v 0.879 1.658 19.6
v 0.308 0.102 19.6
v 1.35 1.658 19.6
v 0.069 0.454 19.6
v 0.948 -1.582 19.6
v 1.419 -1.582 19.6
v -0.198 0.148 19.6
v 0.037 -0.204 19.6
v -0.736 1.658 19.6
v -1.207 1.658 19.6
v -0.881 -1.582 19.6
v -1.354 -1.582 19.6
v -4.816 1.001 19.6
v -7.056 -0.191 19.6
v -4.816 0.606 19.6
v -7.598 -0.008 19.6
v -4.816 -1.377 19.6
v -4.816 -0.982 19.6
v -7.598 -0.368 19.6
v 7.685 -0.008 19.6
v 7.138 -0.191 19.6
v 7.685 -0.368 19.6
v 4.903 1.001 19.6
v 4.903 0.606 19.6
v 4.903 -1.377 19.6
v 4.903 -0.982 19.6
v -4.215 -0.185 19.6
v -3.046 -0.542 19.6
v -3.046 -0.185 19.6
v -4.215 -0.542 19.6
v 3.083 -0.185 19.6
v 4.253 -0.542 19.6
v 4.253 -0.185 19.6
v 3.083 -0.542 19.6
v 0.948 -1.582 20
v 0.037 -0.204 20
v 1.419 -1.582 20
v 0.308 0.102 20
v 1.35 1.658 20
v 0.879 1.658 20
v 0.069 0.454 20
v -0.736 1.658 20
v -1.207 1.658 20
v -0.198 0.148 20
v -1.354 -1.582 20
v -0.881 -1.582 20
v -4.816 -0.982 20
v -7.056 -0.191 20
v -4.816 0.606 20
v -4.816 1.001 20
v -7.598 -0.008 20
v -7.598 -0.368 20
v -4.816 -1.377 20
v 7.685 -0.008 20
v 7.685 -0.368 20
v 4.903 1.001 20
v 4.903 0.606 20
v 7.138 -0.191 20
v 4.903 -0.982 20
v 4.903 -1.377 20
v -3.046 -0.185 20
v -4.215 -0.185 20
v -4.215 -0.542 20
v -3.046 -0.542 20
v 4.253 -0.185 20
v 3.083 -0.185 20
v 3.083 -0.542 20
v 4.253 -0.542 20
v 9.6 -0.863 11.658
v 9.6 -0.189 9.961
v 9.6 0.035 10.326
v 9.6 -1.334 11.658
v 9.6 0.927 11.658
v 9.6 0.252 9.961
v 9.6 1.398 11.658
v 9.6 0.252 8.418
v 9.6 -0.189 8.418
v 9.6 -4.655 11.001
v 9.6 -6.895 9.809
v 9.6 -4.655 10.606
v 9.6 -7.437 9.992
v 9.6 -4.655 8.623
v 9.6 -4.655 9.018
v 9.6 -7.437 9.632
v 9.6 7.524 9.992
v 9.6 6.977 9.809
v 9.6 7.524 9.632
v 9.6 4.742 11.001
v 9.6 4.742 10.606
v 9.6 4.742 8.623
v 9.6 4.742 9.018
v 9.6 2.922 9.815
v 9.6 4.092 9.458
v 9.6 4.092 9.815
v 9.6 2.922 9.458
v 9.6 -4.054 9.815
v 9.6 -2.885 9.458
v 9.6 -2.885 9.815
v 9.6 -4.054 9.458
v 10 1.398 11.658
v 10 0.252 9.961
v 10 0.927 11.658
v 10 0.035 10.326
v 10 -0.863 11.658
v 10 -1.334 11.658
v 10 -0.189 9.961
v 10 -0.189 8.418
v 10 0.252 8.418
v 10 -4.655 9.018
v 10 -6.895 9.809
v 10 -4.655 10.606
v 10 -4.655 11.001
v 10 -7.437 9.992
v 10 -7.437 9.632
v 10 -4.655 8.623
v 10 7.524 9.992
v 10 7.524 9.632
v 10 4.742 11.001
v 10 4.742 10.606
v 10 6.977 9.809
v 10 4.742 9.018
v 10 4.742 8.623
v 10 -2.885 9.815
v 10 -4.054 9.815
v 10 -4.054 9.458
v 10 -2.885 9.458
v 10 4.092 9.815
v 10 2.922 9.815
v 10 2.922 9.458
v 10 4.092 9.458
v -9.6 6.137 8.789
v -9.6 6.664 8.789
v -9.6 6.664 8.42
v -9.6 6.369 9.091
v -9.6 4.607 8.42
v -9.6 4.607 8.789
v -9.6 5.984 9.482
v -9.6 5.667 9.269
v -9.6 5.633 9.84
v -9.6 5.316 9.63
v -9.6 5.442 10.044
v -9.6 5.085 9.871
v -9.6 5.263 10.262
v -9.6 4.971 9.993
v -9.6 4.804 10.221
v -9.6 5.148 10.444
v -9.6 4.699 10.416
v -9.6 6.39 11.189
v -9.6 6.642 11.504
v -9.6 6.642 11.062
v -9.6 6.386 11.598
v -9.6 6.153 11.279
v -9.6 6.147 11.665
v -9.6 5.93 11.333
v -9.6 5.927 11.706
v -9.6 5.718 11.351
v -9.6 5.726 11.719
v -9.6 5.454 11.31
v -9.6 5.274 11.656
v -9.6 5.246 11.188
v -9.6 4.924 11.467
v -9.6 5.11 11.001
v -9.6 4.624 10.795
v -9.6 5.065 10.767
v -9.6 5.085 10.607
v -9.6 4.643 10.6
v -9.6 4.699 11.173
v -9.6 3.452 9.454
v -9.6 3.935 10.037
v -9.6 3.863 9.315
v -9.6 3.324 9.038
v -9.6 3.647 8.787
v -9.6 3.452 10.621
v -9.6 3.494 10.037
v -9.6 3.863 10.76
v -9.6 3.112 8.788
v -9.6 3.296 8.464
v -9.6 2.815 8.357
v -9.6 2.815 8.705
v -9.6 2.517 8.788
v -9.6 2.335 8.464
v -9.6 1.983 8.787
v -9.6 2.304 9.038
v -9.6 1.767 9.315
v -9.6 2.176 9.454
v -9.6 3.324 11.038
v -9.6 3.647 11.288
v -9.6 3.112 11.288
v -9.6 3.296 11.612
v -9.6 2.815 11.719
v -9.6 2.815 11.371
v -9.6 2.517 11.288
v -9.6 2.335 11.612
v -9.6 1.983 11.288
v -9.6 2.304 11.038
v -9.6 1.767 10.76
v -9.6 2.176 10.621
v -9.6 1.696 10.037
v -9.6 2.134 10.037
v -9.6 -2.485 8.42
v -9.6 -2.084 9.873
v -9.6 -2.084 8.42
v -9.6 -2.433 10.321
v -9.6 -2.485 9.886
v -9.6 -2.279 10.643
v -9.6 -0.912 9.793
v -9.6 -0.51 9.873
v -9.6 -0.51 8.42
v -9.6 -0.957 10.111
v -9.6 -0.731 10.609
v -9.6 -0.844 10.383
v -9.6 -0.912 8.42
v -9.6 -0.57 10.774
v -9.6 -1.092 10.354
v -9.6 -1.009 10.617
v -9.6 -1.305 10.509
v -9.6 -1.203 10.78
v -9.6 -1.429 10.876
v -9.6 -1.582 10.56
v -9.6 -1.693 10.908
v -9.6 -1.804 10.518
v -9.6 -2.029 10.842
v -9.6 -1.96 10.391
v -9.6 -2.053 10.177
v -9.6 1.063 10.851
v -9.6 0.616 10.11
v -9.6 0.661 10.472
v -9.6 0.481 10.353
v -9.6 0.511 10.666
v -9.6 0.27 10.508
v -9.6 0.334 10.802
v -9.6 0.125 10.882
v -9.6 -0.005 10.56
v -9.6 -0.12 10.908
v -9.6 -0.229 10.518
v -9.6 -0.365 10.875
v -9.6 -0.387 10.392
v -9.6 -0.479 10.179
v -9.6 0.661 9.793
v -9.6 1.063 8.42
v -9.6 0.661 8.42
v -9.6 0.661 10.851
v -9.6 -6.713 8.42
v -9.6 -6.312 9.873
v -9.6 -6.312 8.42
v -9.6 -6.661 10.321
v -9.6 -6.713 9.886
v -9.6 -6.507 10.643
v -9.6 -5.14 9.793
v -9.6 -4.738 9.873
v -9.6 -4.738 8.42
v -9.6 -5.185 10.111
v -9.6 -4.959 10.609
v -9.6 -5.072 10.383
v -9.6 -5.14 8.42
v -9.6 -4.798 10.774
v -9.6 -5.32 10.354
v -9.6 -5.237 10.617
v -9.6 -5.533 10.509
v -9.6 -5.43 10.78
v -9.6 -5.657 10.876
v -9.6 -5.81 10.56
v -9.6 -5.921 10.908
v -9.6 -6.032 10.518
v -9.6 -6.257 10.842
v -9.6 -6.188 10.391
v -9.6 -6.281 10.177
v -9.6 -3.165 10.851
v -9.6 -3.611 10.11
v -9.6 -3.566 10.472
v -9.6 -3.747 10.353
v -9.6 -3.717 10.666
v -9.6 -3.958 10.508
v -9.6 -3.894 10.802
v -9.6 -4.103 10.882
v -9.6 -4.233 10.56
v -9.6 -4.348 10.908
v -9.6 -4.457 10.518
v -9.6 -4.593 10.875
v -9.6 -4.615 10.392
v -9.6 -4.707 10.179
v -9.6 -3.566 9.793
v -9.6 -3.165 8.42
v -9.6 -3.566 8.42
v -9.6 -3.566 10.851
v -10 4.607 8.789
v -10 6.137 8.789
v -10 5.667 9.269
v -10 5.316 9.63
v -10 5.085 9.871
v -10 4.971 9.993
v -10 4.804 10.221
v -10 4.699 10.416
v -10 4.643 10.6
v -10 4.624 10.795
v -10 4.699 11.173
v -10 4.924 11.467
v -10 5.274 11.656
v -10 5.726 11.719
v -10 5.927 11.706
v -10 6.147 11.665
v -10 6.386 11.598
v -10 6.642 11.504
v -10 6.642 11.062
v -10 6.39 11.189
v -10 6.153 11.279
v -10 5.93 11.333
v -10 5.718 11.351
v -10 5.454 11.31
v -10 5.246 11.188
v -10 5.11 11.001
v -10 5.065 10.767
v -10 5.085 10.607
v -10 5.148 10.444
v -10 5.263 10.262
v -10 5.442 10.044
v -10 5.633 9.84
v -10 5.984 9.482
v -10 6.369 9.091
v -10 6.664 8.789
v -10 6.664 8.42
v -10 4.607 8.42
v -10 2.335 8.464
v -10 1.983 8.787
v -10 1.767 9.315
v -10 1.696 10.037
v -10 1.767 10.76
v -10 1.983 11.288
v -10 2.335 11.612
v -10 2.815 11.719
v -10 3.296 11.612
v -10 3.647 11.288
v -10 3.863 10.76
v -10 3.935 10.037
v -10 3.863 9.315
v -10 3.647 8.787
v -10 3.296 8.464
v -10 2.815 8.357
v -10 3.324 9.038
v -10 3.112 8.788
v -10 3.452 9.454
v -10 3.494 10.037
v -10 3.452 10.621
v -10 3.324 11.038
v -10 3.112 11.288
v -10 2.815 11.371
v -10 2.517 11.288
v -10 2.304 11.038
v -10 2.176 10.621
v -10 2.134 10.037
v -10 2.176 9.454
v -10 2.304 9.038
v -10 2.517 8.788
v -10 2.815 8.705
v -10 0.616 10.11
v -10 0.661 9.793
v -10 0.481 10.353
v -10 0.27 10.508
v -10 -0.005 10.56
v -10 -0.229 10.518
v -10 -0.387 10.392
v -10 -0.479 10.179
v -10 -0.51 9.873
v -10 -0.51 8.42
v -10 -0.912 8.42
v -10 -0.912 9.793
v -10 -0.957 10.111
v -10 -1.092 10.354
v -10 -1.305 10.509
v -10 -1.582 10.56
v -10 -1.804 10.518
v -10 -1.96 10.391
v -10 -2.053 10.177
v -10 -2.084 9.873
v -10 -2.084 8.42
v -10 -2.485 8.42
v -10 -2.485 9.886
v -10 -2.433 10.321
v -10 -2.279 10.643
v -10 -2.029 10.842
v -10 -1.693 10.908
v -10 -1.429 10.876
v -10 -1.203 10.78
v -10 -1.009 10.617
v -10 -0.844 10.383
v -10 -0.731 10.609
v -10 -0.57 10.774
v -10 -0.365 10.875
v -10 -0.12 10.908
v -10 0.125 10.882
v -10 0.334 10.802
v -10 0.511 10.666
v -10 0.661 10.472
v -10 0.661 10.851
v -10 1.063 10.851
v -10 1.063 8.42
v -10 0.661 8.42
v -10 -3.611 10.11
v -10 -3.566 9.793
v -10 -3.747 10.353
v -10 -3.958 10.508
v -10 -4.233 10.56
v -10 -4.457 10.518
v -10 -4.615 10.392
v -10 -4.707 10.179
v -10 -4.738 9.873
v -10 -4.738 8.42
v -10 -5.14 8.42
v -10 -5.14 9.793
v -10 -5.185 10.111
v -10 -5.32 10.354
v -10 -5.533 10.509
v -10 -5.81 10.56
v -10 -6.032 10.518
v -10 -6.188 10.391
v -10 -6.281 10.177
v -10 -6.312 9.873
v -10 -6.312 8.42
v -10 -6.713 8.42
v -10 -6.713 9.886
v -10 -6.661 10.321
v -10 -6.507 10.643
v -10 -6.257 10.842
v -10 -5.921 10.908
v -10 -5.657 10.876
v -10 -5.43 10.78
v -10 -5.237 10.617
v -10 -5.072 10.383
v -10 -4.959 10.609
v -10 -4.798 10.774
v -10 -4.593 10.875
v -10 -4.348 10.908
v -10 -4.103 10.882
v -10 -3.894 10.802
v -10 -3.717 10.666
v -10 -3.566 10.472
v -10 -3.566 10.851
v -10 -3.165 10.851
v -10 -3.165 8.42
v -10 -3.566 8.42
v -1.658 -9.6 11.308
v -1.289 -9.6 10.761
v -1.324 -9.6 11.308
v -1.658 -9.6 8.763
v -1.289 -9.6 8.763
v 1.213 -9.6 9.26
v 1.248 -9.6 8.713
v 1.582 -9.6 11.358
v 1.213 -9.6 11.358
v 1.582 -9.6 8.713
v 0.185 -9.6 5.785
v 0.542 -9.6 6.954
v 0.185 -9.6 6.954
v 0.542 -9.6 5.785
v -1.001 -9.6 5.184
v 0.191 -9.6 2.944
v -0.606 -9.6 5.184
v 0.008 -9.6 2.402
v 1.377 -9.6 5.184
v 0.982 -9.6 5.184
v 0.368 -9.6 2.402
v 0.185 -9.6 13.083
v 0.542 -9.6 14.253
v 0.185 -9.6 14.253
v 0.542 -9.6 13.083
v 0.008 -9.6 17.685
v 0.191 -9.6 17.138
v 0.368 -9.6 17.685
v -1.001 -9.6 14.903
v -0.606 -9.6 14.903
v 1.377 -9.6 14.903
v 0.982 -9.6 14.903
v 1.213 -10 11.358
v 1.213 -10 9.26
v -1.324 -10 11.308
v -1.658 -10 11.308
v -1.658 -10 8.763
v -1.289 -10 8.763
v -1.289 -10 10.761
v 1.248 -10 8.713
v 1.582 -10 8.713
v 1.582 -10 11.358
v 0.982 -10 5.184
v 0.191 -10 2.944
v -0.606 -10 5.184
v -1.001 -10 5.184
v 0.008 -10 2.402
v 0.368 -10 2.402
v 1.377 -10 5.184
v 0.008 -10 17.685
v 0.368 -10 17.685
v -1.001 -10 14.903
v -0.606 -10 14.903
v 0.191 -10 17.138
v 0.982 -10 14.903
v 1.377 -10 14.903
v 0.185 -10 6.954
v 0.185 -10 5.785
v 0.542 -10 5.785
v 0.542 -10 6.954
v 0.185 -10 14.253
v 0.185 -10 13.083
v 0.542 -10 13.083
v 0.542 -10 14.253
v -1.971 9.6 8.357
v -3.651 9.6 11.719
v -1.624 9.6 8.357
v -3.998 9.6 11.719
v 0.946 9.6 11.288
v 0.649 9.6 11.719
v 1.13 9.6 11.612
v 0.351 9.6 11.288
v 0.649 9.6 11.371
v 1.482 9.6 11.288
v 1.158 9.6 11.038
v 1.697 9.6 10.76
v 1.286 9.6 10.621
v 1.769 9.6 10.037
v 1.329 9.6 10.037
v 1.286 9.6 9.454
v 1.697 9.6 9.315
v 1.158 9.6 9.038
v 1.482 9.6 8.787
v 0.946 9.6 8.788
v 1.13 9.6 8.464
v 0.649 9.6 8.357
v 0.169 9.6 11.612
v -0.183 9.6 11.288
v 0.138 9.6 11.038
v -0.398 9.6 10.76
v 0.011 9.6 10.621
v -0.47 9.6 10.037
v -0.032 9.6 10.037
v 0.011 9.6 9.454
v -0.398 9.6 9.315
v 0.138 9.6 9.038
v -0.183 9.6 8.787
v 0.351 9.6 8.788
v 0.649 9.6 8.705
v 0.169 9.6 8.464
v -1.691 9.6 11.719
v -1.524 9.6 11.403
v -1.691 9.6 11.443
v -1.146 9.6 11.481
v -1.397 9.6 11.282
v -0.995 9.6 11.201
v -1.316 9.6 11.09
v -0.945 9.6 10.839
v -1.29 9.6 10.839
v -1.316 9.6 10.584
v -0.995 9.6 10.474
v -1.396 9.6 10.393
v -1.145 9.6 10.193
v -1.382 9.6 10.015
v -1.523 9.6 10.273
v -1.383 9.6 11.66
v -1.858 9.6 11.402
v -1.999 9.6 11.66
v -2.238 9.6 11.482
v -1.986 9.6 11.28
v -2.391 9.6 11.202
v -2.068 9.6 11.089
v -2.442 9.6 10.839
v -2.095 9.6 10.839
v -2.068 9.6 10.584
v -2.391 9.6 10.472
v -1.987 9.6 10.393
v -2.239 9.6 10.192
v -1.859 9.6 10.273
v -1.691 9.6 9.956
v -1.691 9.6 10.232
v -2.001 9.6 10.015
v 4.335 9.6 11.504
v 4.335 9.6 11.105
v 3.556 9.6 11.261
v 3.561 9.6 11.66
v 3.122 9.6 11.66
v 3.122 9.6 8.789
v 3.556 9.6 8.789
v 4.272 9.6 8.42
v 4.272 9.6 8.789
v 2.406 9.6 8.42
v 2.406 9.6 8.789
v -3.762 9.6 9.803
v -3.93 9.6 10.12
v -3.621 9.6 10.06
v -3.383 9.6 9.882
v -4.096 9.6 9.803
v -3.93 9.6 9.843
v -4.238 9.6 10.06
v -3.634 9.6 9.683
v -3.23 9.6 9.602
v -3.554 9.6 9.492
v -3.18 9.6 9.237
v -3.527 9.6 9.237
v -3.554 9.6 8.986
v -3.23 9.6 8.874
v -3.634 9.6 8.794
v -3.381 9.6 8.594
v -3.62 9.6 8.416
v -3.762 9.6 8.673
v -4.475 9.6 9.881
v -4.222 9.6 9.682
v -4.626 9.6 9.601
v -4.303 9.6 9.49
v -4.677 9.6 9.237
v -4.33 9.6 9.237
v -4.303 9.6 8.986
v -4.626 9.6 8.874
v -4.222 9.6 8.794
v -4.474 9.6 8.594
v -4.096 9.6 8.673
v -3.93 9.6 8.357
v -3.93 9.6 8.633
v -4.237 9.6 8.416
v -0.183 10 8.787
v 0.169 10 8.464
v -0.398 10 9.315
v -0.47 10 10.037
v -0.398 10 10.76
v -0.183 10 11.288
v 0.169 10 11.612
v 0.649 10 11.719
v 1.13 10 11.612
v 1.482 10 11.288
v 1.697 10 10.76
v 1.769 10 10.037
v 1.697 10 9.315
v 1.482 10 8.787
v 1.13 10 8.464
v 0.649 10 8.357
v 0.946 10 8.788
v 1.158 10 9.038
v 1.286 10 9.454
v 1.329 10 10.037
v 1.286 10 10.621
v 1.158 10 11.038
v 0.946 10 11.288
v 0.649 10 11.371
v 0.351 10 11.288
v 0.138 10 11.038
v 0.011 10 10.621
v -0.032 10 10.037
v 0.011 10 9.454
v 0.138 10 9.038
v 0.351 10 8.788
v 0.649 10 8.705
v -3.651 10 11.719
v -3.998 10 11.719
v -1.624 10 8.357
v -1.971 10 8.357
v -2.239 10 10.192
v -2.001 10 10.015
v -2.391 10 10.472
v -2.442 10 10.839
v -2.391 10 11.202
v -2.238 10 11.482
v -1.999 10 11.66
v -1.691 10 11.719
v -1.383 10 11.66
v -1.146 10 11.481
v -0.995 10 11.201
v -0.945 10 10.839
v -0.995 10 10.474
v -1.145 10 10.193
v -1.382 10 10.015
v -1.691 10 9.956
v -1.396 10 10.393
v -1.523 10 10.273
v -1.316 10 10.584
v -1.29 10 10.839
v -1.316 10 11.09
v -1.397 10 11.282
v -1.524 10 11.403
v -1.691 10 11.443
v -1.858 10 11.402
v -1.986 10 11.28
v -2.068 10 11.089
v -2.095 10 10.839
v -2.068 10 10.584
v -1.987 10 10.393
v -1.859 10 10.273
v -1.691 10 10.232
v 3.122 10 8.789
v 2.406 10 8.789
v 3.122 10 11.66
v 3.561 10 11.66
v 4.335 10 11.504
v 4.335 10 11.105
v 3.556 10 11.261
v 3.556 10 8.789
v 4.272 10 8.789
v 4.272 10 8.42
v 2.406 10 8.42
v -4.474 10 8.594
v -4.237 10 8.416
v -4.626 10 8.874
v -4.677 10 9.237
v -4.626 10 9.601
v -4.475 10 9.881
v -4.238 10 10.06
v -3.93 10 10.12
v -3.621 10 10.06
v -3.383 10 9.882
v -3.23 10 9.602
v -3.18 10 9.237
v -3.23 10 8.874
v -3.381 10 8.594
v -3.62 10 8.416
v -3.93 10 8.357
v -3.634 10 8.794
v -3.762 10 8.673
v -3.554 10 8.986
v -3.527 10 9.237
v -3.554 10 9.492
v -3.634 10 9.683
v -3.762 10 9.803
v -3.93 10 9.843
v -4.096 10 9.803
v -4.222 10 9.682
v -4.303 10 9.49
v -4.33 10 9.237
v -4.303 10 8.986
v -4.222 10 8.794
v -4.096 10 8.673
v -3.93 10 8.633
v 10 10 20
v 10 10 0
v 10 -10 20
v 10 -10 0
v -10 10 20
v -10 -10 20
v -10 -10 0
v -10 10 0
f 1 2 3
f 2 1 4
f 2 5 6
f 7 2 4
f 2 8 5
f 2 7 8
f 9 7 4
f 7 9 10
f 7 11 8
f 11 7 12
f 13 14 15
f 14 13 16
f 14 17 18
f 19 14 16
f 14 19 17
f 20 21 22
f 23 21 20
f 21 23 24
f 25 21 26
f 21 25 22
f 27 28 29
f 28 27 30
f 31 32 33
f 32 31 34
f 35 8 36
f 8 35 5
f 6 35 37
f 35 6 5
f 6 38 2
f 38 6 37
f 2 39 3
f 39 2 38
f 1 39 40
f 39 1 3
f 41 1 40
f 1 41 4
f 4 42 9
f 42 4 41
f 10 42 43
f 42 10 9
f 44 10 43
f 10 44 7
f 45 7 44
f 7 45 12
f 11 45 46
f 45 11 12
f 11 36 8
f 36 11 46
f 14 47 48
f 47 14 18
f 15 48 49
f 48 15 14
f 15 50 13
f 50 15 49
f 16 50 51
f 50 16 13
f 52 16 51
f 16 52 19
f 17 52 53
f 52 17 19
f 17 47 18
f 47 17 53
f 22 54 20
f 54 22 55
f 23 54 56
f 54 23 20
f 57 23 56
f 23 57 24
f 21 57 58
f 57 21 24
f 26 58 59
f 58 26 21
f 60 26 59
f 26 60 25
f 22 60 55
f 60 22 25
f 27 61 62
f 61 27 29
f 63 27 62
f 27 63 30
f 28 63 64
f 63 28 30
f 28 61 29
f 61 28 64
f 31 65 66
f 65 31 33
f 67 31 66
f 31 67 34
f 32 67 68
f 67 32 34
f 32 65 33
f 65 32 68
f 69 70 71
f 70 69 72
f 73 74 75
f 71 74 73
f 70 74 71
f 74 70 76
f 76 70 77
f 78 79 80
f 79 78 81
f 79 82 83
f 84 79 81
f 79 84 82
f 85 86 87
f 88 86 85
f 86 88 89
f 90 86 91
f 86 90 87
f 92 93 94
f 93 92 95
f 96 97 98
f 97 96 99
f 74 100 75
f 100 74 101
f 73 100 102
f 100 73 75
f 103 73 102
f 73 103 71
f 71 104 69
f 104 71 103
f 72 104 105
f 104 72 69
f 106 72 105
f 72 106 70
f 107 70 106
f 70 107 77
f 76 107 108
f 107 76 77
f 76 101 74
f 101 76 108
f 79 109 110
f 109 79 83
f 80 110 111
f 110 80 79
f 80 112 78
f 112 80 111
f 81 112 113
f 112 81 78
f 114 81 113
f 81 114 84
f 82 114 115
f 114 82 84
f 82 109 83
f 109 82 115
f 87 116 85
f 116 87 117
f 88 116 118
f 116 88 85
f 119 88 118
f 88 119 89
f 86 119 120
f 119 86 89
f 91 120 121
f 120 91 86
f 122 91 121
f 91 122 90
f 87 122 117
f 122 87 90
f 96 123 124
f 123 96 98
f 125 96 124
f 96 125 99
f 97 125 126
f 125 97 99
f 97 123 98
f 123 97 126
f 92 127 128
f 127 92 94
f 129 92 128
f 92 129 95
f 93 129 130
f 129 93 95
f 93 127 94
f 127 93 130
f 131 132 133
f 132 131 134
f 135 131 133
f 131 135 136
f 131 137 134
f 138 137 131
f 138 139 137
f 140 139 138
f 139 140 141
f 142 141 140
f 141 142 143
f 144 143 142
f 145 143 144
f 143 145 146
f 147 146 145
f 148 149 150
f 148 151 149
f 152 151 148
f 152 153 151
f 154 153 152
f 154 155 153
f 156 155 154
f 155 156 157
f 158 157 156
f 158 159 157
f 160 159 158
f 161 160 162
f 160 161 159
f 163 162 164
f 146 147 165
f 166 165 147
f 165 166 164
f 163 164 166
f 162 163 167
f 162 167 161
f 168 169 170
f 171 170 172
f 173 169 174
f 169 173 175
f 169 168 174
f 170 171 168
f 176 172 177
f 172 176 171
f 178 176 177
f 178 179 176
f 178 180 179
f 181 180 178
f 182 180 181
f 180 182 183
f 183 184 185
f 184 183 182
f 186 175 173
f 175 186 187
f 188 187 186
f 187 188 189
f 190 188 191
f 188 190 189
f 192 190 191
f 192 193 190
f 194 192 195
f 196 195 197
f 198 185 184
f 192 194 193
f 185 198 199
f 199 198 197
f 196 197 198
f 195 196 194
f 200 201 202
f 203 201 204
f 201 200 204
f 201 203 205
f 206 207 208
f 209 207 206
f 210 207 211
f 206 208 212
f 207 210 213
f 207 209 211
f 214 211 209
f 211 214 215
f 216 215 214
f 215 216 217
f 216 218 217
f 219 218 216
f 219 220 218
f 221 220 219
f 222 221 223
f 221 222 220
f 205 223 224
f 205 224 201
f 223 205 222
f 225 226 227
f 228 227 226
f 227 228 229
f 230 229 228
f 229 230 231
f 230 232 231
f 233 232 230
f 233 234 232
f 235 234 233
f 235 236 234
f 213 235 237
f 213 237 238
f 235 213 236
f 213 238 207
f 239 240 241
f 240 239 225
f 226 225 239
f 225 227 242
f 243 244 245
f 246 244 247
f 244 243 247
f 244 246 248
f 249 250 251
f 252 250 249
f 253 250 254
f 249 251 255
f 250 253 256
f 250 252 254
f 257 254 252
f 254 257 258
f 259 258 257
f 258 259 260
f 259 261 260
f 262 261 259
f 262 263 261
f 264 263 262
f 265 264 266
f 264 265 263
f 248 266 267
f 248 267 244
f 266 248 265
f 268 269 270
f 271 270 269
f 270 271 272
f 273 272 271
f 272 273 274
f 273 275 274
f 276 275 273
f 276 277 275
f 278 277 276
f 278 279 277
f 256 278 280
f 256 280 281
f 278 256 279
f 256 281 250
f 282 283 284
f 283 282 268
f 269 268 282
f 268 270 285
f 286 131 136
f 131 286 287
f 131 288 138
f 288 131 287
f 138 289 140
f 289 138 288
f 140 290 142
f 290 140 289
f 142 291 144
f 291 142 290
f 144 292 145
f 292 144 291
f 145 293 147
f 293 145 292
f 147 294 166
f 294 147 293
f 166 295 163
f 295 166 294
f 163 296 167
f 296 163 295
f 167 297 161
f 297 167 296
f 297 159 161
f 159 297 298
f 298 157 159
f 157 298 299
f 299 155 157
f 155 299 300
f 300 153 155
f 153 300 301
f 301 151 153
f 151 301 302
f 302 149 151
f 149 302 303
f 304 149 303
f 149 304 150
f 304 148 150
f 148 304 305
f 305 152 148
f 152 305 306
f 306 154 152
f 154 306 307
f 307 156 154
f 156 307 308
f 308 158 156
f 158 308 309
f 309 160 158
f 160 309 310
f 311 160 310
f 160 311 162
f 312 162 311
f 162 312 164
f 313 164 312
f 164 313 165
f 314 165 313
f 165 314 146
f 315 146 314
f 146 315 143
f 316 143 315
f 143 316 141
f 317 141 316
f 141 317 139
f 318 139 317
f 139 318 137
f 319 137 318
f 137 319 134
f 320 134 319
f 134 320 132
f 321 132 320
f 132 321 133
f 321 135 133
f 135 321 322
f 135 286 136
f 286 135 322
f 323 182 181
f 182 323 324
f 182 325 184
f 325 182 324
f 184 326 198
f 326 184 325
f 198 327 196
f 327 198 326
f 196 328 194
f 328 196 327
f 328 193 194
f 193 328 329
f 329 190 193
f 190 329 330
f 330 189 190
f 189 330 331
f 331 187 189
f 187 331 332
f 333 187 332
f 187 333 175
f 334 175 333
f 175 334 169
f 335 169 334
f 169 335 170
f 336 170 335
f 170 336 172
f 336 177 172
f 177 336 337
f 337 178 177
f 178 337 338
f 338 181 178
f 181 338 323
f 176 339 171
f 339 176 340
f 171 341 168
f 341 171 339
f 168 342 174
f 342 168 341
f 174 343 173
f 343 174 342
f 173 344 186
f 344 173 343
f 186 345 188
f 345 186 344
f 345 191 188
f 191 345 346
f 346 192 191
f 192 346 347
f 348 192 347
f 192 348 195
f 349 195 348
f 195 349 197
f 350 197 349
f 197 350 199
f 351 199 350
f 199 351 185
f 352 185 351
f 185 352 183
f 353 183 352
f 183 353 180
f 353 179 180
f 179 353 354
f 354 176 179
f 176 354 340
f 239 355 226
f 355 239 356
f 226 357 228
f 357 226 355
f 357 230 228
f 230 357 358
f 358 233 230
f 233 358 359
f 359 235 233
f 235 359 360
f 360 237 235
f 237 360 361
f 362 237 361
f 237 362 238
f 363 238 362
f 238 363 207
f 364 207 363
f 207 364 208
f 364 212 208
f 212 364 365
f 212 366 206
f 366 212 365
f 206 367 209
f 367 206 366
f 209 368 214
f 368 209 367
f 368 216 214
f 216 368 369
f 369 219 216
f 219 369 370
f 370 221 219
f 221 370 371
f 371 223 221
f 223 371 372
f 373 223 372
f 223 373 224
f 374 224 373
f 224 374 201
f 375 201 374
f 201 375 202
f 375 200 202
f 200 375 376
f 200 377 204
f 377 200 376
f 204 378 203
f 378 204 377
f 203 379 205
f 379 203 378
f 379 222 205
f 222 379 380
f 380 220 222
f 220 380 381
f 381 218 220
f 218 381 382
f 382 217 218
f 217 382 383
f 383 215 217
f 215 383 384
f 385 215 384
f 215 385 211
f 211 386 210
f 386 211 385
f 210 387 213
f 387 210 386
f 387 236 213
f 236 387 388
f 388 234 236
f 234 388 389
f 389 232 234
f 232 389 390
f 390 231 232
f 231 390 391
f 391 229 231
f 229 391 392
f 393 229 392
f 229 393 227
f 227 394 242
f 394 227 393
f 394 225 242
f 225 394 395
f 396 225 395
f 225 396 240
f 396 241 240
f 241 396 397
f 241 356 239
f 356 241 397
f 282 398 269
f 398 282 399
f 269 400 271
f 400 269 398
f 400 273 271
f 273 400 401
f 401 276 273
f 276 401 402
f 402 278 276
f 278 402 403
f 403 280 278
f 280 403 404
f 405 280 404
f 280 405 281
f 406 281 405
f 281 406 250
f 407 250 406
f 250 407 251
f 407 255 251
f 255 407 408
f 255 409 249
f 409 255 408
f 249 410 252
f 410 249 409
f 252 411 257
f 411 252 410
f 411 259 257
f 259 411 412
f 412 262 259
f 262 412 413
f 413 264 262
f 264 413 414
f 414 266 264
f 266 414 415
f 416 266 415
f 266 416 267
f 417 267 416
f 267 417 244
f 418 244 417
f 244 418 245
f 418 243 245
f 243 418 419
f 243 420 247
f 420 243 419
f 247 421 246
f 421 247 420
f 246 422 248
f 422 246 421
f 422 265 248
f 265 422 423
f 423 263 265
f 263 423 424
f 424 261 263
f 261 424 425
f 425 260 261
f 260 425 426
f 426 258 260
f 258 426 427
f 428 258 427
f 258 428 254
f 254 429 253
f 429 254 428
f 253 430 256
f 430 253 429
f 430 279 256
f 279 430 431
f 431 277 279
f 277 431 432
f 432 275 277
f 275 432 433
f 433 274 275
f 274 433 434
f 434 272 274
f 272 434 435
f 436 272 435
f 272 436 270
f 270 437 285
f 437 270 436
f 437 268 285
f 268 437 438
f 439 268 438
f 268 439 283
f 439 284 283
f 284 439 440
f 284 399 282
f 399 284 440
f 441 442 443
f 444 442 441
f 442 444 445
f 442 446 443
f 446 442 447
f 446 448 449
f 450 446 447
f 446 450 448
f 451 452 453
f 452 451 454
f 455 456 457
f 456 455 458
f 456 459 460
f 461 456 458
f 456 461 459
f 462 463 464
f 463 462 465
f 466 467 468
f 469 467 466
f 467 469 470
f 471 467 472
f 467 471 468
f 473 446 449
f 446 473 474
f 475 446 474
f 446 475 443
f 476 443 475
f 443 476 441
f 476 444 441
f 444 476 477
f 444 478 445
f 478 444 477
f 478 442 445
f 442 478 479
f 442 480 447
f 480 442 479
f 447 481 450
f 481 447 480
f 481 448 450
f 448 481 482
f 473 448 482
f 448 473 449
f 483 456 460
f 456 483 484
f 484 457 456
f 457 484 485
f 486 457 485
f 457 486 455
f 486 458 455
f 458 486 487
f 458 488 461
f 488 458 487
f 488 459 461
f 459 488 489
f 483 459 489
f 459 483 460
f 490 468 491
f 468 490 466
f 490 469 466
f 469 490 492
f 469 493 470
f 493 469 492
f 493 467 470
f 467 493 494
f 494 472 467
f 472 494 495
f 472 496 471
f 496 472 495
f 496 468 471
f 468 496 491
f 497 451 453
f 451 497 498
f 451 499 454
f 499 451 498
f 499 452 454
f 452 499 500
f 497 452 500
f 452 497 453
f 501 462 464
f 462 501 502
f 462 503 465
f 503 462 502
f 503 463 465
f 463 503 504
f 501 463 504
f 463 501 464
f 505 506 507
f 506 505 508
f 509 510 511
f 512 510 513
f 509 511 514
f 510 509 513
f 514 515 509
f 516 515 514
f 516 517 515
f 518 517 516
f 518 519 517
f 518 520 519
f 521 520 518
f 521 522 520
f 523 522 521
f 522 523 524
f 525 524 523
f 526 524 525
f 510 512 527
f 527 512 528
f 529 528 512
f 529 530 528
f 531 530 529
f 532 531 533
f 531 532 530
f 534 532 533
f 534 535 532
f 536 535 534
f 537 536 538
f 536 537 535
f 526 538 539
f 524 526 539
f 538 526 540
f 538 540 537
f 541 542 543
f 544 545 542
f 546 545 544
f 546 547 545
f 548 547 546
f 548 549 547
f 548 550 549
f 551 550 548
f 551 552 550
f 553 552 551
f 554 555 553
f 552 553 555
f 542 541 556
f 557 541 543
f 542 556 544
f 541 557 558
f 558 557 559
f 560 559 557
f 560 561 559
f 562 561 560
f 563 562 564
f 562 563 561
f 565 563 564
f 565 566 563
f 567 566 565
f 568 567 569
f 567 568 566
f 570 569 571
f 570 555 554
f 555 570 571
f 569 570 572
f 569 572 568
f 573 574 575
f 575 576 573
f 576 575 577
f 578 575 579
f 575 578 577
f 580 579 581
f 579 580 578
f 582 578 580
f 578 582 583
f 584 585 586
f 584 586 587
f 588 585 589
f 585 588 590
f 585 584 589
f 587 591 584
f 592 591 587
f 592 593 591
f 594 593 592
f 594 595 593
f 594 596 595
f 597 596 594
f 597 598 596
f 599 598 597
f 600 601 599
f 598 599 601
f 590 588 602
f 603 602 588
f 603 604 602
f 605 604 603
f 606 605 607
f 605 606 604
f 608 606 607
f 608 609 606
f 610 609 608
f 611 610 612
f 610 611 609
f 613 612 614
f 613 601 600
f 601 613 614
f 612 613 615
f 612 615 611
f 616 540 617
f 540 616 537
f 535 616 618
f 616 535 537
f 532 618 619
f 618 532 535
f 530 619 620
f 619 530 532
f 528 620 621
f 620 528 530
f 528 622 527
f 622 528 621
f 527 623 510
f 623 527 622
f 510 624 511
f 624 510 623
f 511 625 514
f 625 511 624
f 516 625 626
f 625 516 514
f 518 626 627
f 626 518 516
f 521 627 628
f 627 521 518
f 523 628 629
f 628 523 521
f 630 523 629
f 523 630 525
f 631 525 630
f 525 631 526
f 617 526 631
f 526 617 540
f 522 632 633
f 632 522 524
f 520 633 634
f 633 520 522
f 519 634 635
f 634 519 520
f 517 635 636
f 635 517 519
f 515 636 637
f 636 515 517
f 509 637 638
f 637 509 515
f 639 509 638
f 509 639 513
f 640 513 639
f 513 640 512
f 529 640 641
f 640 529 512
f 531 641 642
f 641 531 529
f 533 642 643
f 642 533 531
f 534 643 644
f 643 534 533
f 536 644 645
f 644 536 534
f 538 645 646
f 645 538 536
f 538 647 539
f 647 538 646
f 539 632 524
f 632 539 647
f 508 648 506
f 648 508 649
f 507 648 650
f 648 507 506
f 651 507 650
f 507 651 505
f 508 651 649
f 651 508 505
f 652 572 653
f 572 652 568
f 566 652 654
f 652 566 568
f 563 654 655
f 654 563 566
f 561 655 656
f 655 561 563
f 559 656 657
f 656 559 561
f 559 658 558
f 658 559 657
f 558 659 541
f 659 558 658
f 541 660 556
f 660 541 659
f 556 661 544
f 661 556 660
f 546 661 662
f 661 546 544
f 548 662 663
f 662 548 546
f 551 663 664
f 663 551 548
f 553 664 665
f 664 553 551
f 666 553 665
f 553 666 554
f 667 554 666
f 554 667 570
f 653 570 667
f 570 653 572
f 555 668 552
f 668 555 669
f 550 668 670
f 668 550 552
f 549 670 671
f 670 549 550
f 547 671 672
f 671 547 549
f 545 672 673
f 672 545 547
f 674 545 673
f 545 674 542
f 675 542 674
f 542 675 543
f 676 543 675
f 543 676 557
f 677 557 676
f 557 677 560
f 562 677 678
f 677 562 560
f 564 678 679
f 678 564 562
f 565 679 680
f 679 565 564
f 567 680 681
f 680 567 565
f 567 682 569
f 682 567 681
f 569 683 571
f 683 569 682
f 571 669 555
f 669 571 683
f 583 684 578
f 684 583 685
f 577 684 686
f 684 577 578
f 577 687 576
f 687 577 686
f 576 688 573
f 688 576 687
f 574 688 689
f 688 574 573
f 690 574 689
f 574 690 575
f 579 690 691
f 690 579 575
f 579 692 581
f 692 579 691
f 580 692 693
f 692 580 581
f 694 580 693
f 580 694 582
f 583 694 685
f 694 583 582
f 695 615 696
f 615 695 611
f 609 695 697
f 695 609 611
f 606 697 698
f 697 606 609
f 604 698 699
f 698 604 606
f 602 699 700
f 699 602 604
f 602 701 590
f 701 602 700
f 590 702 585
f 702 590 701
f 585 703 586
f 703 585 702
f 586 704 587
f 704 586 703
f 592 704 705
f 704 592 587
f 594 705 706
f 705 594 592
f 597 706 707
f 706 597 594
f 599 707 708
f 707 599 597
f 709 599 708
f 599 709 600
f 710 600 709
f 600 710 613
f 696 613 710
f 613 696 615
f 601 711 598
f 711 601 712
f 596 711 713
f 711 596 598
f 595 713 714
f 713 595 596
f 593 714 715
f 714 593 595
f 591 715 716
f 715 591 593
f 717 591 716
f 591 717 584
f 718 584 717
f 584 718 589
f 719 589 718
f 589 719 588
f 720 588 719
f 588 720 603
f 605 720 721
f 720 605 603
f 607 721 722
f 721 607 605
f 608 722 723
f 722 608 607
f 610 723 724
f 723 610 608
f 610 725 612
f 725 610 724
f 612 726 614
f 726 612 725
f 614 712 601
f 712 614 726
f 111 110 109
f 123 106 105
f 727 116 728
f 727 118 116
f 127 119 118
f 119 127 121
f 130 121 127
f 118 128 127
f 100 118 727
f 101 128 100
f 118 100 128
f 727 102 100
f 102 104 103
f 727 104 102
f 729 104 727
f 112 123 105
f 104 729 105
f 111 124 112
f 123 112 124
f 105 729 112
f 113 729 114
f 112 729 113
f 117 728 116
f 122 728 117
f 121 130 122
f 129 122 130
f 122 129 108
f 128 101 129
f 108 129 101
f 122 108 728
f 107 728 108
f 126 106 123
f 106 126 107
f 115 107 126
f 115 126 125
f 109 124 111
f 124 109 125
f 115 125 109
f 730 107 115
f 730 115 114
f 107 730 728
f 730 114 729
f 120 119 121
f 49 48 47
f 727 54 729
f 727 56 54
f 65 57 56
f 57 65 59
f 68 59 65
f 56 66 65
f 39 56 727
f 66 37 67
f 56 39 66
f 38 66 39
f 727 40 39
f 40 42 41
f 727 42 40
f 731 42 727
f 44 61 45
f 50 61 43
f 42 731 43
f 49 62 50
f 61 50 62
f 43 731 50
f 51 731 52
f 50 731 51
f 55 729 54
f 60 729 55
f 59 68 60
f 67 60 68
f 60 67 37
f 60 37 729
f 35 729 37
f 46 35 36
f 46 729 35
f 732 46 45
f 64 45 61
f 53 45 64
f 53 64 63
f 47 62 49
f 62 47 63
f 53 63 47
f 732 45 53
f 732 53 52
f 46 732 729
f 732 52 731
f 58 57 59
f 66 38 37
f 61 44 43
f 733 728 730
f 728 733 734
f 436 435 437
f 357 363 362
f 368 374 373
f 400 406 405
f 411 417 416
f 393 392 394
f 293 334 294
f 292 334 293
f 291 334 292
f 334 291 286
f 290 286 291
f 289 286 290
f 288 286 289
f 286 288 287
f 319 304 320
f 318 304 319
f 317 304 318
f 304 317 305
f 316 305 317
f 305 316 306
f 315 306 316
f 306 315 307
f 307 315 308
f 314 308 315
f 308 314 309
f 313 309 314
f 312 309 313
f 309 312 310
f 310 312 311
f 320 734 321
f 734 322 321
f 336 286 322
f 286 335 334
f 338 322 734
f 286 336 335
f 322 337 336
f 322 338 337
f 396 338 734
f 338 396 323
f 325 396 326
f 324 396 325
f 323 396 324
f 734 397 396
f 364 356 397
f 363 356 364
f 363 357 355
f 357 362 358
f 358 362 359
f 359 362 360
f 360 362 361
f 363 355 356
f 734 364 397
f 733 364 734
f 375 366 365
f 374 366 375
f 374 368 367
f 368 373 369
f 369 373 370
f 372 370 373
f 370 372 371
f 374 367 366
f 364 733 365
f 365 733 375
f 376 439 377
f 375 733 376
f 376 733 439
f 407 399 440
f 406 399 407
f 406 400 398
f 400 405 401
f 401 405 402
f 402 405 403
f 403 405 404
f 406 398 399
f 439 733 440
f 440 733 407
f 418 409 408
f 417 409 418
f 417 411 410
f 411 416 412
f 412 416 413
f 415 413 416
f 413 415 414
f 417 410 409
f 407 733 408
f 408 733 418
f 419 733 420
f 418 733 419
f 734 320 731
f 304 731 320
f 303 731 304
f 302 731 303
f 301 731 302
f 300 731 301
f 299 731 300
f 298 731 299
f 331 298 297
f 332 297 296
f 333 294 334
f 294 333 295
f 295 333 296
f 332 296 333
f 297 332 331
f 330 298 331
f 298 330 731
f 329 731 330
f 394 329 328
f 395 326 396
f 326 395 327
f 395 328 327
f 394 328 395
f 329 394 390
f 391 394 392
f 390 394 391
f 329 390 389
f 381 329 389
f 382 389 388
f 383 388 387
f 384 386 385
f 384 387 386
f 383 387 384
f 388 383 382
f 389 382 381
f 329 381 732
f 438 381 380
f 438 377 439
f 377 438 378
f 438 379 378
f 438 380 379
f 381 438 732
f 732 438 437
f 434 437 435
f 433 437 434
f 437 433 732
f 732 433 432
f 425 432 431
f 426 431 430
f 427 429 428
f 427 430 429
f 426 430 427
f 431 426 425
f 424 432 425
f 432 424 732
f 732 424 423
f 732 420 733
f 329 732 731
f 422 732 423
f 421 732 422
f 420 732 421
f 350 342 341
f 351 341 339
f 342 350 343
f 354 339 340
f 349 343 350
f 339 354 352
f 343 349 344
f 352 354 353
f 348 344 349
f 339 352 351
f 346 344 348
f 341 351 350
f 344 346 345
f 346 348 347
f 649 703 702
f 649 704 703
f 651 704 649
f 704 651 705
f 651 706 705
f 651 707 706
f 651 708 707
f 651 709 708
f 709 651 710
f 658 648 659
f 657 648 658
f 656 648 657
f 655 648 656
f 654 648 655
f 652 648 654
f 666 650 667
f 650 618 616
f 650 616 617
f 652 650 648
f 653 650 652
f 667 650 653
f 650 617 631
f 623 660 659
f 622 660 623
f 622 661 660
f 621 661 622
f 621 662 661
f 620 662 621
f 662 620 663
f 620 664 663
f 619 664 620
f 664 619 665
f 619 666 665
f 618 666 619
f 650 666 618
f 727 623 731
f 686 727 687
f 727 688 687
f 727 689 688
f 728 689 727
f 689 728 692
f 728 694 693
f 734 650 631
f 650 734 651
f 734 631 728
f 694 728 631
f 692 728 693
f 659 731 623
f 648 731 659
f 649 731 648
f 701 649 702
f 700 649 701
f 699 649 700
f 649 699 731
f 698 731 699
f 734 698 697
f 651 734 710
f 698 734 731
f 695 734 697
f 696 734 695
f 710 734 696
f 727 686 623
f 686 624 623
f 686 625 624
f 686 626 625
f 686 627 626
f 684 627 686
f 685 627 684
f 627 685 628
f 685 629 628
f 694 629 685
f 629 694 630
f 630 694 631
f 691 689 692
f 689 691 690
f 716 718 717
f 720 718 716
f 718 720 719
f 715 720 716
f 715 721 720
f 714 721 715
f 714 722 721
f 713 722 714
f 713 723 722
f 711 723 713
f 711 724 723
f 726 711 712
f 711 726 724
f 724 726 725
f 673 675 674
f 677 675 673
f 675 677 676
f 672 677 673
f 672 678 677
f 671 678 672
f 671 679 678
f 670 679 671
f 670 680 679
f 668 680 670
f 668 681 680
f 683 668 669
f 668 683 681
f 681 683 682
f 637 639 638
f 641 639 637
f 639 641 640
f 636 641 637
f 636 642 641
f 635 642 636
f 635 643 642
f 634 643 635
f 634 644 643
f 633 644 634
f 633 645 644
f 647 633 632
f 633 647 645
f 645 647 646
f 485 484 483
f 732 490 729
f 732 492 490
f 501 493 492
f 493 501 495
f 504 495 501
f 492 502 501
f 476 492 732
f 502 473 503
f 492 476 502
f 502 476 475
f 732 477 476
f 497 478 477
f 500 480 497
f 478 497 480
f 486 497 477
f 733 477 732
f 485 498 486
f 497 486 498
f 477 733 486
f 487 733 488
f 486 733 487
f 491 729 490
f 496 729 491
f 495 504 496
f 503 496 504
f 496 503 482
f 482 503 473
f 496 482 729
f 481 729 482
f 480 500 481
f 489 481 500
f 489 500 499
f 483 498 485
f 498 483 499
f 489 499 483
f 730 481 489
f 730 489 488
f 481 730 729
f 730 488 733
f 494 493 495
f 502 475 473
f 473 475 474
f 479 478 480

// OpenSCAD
// Calibration Cube - Parametric v1.0
//	 Author:	KatTrue (Thingiverse)
//	 Date:		4/30/2017
//
//	This OpenSCAD program creates a user definable sized
//	calibration cube.
//
//	- The X, Y, and Z axis are user definably labeled.
//
//	- Size is printed on one side.  The calibration cube 
//	supports both metric and imperial/SAE units of measure.
//
//	- Infill Percentage is printed on one side.  The Infill 
//	Percentage is only included on the calibration cube for 
//	reference.  The infill percentage is set in the slicer.
//
//	- Due to OpenSCAD font limitations the font will get smaller 
//	in relation to the overall size once 380" is exceeded.

/* [Hidden] */
inchConv = 0.79375; // 1/32" in mm
textSizeMult = 4; // Text Size Multiplier
textSizeThreshold = 1544; // Text size to stop scaling text

/* [Configuration ] */
// Dimension Length in Unit of Measure
size = 20; // [1:1000]
// Infill Percentage (Label Only)
infillPct = 10;
// Unit of Measure
unitOfMeasure = 0; // [0:mm,1:1/32in.,2:1/16in.,3:1/8in.,4:1/4in.,5:1/2in.,6:in.]

/* [Text] */
// X Axis Label
xText = "<- X ->";
// Y Axis Label
yText = "<- Y ->";
// Z Axis Label
zText = "<- Z ->";
// Text Font
textFont = "Tahoma";

sizeXYZ = unitOfMeasure ? size * (inchConv * pow(2,unitOfMeasure-1)) : size;
SAEText = unitOfMeasure == 6 ? "\"" : str("/",32/pow(2,unitOfMeasure-1),"\"");
sizeText = unitOfMeasure ? str(round(size),SAEText) : str(sizeXYZ, "mm");
infillText = str(infillPct, "%");
textHeight = sizeXYZ / 25;
textSize = textSizeMult * textHeight > textSizeThreshold ? textSizeThreshold : textSizeMult * textHeight;

translate([0,0,sizeXYZ/2])
	difference()
	{
		cube (size = sizeXYZ, center=true);
		union()
		{
			translate([0,0,(sizeXYZ-textHeight)/2])
				linear_extrude(textHeight)
					text(xText, size=textSize, font=textFont, valign="center", halign="center");
			translate([(sizeXYZ-textHeight)/2,0,0])
				rotate([90,0,90])
					linear_extrude(textHeight)
						text(yText, size=textSize, font=textFont, valign="center", halign="center");
			translate([-(sizeXYZ-textHeight)/2,0,0])
				rotate([90,0,-90])
					linear_extrude(textHeight)
						text(sizeText, size=textSize, font=textFont, valign="center", halign="center");
			translate([0,-(sizeXYZ-textHeight)/2,0])
				rotate([90,-90,0])
					linear_extrude(textHeight)
						text(zText, size=textSize, font=textFont, valign="center", halign="center");
			translate([0,(sizeXYZ-textHeight)/2,0])
				rotate([90,0,180])
					linear_extrude(textHeight)
						text(infillText, size=textSize, font=textFont, valign="center", halign="center");
		} // End union()
	} //End difference()
